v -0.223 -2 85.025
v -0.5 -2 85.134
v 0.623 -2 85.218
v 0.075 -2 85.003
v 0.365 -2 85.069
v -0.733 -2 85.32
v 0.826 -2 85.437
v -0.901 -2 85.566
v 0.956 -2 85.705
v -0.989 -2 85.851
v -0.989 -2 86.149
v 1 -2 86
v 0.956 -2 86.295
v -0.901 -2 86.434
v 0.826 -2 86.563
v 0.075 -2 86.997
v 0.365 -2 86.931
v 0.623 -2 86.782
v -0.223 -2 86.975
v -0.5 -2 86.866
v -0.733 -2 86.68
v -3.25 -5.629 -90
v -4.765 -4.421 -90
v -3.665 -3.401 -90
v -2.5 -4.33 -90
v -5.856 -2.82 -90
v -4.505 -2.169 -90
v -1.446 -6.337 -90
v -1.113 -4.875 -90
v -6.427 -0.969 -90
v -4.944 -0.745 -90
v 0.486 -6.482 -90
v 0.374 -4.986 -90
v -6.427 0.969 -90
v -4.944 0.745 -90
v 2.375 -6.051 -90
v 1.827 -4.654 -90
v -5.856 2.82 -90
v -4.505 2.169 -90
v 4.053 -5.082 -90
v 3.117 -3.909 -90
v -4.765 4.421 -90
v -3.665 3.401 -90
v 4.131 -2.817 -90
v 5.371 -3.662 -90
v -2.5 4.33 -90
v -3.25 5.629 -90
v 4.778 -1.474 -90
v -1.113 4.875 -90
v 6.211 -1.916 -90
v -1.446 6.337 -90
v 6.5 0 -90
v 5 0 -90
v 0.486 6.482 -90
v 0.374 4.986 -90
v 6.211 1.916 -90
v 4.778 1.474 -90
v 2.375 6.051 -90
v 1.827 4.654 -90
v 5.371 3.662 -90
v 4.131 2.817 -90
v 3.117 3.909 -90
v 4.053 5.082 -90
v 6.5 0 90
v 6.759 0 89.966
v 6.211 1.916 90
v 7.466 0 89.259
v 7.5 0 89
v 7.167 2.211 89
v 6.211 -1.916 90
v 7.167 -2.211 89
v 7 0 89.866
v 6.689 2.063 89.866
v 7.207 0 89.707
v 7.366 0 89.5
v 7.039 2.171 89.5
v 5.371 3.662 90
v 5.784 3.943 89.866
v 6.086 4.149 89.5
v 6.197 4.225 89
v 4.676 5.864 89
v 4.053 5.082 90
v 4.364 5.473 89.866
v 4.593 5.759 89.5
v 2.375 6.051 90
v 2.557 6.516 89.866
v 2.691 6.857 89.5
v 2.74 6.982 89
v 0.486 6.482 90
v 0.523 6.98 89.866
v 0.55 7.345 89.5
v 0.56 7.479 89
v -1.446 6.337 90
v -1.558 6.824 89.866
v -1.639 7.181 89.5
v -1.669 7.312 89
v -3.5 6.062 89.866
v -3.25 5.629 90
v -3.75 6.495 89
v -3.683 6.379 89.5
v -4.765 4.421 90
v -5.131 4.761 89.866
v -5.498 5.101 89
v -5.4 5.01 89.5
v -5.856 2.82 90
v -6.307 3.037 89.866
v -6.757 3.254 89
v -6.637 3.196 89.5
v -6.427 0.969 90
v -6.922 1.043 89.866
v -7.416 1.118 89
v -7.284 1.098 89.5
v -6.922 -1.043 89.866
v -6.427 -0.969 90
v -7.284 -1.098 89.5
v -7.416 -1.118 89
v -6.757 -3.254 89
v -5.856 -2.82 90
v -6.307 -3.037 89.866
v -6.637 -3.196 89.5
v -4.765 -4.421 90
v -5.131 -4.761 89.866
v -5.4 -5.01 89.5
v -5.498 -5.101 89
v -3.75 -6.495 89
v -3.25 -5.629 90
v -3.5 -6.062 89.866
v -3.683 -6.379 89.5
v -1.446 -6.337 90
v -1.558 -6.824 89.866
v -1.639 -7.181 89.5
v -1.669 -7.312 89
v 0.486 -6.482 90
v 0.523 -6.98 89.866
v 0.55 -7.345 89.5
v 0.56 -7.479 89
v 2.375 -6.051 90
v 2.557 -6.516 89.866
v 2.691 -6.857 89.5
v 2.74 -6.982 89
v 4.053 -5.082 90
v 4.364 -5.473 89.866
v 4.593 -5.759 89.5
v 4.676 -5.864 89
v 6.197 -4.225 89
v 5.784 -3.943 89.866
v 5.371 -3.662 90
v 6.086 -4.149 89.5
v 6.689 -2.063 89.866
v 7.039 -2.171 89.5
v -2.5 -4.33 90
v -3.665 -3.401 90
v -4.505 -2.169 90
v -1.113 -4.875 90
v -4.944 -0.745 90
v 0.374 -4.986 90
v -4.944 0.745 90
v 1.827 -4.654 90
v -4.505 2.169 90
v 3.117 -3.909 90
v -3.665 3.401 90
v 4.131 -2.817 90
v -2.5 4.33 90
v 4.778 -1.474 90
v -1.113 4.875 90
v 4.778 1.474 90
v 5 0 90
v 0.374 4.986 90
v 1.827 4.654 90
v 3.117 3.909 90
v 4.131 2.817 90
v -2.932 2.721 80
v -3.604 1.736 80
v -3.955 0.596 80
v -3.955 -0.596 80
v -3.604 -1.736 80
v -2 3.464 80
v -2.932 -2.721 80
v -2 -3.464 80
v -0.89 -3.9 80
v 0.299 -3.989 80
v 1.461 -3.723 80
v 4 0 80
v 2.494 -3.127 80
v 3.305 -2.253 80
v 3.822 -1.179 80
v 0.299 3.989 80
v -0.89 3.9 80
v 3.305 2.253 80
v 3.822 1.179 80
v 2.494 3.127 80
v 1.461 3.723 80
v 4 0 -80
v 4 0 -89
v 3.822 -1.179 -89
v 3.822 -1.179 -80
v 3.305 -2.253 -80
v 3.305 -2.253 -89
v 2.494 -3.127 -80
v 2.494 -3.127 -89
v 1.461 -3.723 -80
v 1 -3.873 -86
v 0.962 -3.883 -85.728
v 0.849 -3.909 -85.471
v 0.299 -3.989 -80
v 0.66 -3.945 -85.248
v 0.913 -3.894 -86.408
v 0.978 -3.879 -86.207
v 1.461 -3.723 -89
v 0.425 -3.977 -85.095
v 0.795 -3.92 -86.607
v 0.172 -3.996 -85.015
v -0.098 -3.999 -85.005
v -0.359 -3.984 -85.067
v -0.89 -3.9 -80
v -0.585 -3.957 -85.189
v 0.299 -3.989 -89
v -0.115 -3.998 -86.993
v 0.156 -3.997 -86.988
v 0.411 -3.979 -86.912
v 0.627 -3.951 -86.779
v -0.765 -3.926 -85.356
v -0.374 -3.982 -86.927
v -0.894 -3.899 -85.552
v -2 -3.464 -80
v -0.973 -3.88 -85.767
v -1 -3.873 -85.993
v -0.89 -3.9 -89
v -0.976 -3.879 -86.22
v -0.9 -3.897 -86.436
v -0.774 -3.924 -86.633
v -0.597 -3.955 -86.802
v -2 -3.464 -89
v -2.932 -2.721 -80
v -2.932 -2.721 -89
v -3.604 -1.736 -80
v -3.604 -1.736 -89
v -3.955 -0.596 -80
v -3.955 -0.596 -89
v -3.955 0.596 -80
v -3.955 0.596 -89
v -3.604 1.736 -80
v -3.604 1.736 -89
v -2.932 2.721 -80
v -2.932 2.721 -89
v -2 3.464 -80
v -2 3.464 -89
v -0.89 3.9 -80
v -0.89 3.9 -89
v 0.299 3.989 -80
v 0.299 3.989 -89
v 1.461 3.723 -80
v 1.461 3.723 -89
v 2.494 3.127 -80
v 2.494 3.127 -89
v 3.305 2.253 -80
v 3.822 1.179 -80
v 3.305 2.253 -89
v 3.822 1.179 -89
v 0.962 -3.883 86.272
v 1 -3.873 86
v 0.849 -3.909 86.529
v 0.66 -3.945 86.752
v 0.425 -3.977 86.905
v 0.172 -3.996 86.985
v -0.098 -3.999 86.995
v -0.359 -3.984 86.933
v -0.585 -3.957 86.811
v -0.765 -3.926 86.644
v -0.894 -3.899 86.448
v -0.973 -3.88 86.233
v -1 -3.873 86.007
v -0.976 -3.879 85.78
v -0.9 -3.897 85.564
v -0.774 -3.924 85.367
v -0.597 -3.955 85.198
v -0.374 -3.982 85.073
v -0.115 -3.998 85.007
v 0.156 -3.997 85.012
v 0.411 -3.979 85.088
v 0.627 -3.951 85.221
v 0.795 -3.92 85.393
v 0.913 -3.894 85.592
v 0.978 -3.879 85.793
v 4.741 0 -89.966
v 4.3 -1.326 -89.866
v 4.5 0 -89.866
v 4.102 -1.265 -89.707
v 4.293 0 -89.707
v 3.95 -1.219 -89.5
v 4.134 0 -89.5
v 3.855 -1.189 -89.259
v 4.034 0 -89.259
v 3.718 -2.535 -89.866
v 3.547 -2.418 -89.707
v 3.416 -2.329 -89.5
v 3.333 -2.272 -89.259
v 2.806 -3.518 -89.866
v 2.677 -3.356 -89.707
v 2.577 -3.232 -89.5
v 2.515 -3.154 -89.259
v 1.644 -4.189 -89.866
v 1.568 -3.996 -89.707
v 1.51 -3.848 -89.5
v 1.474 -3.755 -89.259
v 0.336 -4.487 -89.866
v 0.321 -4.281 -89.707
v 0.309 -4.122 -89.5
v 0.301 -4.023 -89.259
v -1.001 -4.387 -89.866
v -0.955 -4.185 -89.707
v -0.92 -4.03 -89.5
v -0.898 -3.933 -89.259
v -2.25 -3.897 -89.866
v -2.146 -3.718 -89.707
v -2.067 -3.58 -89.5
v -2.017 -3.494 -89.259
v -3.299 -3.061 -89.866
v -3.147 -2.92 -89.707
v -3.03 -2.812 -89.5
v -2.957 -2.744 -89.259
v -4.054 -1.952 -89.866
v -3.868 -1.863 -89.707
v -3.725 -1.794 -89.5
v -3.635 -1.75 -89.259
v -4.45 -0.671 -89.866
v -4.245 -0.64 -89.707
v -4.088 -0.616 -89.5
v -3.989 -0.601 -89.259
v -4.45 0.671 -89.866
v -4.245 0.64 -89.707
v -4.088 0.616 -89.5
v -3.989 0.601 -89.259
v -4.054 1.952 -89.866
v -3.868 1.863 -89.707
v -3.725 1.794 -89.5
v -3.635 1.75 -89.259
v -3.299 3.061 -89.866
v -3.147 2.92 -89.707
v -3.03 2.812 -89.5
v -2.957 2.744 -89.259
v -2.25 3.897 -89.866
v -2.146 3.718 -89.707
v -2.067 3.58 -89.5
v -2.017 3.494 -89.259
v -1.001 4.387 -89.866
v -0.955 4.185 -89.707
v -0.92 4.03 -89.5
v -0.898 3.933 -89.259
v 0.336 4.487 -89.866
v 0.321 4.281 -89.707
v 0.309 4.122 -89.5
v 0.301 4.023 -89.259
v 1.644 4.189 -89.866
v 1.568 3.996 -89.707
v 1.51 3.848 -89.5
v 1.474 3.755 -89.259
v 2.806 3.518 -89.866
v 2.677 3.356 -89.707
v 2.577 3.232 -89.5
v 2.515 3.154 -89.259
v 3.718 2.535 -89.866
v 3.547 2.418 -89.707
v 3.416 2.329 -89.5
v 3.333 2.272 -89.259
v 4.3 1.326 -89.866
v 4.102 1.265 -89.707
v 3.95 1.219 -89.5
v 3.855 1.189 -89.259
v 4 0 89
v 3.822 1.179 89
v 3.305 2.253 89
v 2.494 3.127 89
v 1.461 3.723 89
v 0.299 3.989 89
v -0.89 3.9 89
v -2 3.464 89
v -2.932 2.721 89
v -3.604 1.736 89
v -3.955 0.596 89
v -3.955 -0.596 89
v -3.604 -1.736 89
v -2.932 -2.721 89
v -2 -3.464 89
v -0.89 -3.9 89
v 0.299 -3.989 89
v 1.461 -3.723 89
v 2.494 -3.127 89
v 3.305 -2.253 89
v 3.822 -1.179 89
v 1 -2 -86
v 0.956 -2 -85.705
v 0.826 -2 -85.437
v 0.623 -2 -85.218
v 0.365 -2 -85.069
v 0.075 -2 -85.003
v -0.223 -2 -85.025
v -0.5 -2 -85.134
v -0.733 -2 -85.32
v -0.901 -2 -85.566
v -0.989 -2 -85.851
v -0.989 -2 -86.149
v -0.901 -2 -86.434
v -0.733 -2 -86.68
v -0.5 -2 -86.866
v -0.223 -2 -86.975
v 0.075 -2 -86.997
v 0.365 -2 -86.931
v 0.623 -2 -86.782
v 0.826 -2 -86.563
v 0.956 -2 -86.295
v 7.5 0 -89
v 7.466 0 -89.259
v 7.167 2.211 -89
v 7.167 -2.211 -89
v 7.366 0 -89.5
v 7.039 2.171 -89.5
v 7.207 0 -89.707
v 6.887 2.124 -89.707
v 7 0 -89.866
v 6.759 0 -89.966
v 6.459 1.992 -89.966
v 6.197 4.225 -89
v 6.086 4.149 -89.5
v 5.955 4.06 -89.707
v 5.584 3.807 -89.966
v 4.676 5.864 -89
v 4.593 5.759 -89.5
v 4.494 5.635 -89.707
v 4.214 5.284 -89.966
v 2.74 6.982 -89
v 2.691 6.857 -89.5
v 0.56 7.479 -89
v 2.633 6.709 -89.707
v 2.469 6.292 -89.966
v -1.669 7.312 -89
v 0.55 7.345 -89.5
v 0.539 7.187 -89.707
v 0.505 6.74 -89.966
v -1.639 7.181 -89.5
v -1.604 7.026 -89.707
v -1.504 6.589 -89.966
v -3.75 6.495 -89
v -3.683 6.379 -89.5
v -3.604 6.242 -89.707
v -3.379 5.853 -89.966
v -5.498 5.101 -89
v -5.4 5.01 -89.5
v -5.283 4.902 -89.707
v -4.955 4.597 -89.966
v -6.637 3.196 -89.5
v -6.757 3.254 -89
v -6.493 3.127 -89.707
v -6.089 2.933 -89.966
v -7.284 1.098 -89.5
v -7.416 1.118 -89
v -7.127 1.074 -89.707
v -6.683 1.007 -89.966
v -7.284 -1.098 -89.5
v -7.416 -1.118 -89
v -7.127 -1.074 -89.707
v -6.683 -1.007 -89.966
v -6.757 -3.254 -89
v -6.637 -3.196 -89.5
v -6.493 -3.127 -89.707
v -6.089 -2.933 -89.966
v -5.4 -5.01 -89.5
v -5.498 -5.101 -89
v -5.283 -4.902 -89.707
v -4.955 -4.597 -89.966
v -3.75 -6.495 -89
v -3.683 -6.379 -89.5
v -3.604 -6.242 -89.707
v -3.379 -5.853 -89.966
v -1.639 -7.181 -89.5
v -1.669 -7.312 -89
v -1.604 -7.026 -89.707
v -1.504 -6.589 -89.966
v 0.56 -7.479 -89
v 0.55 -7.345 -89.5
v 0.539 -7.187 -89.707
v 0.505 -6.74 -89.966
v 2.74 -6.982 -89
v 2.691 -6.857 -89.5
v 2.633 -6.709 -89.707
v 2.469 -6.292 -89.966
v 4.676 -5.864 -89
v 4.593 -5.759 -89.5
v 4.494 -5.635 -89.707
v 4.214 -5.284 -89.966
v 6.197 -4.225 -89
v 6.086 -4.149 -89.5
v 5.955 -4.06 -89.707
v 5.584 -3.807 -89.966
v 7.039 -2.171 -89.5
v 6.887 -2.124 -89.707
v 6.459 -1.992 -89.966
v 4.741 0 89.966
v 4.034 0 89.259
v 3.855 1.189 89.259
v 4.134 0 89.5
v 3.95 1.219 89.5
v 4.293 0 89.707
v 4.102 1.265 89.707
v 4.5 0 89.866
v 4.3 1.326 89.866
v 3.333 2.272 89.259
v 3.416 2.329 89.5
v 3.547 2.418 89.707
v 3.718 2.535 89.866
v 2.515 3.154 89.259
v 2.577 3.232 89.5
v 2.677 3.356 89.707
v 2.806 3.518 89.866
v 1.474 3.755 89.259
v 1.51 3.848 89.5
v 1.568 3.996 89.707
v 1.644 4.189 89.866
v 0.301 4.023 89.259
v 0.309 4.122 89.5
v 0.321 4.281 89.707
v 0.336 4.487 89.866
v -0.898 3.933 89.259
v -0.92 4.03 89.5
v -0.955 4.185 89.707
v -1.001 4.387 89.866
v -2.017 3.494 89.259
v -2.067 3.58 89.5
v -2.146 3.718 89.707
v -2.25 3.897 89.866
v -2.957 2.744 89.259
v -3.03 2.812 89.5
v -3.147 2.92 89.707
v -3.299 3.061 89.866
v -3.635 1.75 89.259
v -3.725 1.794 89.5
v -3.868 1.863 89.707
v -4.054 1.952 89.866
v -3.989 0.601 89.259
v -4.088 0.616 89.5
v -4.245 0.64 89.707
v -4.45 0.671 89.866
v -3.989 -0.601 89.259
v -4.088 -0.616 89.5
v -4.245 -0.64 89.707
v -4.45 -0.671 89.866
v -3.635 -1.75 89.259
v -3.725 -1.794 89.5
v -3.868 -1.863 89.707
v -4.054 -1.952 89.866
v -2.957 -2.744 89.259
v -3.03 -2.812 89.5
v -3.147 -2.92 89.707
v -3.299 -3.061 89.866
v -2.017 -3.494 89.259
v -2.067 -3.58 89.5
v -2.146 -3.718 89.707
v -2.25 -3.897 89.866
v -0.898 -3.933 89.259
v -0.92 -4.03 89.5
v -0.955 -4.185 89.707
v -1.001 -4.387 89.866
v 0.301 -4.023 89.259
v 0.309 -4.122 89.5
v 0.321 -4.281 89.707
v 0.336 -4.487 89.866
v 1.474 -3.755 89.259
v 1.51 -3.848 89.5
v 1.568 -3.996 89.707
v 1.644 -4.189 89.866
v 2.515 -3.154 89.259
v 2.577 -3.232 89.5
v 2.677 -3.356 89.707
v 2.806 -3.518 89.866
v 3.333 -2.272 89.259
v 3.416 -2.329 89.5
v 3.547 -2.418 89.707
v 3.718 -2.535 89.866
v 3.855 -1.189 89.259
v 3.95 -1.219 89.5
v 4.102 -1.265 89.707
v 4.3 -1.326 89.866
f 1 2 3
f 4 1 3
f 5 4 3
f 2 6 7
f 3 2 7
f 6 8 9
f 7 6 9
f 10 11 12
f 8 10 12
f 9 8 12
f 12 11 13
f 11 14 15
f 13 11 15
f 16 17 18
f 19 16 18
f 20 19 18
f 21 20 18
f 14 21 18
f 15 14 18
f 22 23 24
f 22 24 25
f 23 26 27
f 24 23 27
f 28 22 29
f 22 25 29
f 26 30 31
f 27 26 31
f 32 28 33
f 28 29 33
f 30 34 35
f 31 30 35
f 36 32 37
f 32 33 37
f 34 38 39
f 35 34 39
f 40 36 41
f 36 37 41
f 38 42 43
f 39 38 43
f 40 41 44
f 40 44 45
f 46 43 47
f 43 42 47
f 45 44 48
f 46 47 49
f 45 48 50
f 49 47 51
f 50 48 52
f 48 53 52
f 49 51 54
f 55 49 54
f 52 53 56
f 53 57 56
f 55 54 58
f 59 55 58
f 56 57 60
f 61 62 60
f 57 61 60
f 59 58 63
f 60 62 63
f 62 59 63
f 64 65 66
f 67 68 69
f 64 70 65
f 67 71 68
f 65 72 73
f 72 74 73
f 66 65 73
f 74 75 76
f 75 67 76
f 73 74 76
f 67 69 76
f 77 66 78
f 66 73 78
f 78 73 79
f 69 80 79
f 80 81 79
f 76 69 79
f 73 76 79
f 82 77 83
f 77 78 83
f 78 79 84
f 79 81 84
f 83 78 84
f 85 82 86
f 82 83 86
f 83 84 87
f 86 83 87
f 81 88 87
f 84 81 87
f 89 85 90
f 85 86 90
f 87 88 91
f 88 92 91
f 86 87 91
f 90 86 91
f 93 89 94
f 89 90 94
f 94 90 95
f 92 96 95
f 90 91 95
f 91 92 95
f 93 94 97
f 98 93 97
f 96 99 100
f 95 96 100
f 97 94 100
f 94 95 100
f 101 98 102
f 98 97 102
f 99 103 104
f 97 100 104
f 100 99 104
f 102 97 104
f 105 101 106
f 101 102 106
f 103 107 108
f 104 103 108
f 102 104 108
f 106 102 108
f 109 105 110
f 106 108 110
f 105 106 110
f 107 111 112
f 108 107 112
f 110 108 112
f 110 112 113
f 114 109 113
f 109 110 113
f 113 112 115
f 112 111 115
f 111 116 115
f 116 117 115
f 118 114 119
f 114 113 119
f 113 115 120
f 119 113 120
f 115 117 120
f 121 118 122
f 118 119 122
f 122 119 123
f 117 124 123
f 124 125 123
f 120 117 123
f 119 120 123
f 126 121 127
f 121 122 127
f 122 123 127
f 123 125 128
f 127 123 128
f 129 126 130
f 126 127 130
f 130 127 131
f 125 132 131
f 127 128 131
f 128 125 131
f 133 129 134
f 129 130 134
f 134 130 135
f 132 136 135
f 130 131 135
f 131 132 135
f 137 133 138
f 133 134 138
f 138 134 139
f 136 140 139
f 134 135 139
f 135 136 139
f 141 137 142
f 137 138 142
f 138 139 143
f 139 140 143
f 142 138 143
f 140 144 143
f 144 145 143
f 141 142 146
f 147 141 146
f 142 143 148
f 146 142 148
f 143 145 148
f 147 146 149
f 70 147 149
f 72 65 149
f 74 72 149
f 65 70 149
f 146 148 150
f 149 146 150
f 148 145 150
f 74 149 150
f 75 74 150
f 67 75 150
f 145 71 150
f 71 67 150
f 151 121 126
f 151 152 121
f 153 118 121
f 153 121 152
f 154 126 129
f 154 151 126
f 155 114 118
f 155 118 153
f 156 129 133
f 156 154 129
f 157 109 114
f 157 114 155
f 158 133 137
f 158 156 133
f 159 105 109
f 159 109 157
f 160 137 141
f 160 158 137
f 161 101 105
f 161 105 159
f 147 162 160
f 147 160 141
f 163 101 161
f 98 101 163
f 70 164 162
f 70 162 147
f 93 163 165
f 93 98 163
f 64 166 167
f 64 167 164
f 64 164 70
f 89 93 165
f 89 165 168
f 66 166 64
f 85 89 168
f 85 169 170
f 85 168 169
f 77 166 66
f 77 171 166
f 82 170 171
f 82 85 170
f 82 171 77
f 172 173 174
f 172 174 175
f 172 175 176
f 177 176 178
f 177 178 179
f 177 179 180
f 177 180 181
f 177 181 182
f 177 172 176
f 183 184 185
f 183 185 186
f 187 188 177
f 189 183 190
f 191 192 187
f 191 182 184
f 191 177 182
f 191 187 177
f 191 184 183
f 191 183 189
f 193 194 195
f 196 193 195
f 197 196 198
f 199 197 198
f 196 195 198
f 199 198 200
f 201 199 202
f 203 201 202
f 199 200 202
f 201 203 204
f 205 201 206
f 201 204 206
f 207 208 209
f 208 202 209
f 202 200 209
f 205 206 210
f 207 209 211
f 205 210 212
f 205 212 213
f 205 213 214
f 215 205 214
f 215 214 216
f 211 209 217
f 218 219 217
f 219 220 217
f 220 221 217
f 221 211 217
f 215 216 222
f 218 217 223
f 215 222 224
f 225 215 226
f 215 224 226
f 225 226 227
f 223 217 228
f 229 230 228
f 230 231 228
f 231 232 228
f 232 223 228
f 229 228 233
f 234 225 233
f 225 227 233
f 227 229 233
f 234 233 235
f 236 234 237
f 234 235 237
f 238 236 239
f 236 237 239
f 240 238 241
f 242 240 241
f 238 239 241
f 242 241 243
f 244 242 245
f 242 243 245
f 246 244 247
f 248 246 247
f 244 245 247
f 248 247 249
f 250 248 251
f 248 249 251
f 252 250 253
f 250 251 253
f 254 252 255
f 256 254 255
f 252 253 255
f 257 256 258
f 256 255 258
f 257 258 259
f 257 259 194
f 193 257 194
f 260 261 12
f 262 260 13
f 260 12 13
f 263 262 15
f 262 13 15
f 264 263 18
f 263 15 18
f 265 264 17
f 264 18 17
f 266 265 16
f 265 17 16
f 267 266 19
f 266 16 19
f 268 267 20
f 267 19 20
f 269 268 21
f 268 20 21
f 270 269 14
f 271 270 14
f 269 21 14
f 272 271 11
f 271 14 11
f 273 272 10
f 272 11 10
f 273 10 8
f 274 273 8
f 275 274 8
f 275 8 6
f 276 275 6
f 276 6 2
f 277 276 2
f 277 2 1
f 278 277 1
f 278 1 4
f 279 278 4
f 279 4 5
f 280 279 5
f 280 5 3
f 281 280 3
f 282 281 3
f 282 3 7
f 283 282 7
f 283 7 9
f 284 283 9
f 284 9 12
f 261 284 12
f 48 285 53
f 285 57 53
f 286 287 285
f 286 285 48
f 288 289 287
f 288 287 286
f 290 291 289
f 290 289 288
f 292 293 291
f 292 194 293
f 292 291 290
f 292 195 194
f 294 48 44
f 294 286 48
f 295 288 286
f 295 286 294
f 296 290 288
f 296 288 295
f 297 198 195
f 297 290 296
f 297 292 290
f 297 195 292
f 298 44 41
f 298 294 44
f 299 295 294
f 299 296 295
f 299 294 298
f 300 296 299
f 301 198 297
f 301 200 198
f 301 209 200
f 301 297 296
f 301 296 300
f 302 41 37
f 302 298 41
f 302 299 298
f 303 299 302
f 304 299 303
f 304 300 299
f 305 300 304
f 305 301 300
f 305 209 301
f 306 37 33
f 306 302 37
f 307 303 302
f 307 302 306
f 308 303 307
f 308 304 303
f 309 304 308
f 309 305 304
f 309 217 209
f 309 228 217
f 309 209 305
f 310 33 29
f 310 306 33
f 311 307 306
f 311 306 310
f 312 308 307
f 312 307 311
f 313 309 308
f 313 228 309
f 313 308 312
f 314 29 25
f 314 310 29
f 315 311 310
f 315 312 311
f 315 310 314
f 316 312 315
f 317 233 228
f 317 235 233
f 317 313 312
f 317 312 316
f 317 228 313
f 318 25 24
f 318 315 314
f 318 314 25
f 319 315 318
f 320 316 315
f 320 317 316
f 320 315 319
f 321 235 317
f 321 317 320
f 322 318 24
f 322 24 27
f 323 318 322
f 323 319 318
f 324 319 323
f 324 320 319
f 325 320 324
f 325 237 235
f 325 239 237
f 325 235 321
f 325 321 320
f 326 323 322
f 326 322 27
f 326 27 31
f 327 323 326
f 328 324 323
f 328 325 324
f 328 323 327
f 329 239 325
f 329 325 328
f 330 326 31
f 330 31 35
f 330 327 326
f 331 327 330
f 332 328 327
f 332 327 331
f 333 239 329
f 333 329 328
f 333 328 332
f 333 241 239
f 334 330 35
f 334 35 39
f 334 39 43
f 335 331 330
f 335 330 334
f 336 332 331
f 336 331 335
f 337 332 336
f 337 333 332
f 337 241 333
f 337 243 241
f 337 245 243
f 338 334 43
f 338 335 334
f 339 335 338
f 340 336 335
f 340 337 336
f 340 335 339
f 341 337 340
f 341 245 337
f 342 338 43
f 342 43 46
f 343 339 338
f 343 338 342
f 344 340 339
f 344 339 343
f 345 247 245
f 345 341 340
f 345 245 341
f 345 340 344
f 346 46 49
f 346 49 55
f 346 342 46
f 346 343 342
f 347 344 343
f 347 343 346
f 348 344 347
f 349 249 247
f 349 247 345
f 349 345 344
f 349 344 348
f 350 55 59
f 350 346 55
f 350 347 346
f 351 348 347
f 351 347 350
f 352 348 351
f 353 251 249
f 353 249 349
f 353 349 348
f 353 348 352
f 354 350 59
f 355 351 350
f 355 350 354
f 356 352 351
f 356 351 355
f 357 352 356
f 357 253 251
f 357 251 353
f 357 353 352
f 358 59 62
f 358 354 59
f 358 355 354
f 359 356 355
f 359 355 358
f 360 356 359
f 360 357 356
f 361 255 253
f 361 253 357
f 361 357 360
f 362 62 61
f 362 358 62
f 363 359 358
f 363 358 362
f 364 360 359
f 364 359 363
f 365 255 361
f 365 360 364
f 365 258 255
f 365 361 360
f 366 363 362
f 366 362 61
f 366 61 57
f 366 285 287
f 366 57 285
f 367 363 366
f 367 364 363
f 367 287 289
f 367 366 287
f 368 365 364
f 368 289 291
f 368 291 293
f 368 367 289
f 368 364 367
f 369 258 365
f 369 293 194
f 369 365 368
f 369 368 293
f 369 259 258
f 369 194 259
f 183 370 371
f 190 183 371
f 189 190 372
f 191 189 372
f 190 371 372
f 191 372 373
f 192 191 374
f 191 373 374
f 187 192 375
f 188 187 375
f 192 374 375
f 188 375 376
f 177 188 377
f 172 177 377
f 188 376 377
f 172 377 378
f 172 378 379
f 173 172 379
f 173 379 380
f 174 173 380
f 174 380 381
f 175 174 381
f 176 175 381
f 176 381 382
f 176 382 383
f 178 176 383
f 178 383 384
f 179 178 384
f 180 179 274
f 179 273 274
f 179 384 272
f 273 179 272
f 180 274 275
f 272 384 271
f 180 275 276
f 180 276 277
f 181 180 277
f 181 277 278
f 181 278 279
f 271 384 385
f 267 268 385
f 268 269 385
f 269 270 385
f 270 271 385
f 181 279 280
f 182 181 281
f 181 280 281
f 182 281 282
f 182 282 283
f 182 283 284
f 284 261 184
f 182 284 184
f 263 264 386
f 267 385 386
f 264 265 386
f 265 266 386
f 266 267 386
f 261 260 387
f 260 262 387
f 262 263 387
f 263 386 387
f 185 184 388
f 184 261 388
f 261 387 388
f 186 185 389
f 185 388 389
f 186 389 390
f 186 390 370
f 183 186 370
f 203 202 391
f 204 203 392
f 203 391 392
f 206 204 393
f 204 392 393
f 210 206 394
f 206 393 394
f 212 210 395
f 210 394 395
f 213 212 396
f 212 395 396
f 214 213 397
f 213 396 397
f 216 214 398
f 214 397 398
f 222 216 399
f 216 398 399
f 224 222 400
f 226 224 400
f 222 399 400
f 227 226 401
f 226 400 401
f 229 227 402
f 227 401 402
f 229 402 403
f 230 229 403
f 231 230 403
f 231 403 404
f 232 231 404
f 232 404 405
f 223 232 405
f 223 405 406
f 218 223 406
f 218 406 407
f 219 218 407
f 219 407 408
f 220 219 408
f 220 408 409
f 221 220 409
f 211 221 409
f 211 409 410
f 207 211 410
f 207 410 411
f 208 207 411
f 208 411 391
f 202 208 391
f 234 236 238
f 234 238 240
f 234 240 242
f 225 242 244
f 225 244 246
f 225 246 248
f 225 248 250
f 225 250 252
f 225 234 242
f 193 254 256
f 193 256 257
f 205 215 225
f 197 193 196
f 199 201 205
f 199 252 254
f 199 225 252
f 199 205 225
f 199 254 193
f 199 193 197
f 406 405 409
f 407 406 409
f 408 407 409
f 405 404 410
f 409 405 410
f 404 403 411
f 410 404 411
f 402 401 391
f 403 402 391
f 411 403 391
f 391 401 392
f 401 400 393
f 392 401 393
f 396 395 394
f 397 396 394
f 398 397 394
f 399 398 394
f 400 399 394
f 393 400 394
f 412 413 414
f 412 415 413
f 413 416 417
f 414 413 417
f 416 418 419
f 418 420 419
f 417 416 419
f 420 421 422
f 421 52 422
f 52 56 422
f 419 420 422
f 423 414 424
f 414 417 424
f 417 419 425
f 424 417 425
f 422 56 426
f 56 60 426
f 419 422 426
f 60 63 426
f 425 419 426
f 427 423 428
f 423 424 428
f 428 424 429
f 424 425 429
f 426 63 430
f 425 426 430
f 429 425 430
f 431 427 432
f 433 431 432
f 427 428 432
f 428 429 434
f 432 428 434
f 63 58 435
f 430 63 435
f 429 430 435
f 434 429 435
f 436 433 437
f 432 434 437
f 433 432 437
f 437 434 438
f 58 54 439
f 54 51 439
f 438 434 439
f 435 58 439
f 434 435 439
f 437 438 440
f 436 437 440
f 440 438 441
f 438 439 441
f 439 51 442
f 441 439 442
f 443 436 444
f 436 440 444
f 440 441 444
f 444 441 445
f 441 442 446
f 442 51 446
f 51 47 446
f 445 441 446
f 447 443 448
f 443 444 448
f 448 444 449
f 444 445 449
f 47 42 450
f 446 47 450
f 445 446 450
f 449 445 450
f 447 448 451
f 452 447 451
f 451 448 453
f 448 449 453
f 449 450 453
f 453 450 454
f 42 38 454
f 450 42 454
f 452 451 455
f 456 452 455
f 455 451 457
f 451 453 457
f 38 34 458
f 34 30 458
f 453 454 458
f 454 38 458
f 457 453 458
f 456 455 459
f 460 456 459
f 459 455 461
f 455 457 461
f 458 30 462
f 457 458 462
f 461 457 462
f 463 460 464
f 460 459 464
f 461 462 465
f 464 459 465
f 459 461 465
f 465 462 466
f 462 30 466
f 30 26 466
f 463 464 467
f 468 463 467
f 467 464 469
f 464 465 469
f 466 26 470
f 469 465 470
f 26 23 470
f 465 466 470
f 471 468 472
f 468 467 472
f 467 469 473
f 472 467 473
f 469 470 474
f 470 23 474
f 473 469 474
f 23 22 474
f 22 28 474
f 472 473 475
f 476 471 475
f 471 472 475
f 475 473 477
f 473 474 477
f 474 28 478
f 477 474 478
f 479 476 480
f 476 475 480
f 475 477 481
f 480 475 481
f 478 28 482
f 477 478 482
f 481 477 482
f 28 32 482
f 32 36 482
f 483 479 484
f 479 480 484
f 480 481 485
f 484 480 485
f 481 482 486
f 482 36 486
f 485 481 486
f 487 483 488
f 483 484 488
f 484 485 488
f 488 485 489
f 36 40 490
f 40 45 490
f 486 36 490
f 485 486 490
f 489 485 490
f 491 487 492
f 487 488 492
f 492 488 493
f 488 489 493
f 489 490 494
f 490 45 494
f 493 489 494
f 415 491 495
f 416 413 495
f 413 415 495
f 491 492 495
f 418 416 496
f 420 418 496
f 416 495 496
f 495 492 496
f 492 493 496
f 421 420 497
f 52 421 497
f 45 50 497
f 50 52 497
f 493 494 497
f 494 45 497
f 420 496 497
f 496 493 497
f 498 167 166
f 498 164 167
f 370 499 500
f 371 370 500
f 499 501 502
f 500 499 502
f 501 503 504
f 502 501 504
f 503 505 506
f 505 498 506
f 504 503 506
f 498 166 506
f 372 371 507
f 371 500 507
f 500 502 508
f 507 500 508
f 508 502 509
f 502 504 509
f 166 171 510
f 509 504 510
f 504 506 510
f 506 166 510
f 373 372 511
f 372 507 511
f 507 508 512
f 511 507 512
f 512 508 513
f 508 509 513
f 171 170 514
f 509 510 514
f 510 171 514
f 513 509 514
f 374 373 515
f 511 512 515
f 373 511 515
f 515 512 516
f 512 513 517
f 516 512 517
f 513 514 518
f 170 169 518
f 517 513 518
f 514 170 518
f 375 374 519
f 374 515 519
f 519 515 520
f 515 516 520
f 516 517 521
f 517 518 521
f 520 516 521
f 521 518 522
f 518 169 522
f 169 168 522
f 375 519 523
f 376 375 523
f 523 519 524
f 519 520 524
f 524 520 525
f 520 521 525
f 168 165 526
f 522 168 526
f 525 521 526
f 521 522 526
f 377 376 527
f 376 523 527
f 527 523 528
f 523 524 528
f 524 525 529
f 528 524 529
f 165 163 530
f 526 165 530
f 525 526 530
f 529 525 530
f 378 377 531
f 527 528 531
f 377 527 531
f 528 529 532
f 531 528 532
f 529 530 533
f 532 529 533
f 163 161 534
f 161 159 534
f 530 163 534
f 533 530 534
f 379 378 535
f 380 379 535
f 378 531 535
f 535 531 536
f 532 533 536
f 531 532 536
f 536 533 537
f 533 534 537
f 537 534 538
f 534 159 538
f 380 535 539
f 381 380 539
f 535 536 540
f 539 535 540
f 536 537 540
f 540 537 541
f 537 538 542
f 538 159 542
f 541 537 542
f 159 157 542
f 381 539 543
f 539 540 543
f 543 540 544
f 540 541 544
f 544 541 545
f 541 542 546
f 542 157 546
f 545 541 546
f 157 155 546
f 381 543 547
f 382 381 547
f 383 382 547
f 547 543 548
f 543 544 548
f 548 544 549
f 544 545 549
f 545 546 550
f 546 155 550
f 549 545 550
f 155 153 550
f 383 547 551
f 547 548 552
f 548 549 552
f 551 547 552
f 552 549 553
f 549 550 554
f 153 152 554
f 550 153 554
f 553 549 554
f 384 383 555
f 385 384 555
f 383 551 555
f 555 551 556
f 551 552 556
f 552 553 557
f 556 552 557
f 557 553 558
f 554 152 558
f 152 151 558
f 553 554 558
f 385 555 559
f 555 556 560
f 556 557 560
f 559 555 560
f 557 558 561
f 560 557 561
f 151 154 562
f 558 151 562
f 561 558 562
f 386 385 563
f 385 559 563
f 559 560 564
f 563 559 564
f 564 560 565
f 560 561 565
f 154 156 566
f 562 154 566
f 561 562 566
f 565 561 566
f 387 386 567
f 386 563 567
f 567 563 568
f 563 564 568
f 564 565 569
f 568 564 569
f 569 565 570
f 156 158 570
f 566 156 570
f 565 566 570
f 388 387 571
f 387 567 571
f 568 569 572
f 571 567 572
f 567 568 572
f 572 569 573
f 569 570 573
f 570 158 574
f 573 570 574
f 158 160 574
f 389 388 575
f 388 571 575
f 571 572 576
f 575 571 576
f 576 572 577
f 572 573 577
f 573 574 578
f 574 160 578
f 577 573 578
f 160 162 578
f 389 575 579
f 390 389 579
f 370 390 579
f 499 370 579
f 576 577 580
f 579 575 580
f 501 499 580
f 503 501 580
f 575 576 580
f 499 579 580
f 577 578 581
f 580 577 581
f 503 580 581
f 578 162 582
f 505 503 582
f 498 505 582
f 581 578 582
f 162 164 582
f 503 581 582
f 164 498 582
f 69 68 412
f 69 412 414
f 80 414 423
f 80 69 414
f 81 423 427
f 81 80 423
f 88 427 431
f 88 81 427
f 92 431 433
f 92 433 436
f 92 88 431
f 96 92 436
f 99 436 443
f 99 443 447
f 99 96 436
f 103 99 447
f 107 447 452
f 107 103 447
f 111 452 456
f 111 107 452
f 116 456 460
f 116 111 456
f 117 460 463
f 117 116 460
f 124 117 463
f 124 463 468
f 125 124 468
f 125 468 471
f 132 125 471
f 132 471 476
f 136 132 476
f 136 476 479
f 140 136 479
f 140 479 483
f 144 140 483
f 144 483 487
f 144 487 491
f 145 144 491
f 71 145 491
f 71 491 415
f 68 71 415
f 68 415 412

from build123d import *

# Parameters (mm, degrees)
F0_R     = 7.5
F1_DEPTH = 90
F2_R     = 4
F3_DEPTH = 10
F4_R     = 4
F5_DEPTH = 10
F6_R     = 1
F7_DEPTH = 5.0000001171
F8_DEPTH = 2
F9_R     = 1


with BuildPart() as f1:
    # F0 (on Top) → F1 (new body, symmetric)
    with BuildSketch(Plane.XY):
        Circle(F0_R)
    extrude(amount=F1_DEPTH, both=True)

    # F2 (on face) → F3 (cut)
    with BuildSketch(Plane.XY.offset(90)):
        Circle(F2_R)
    extrude(amount=-F3_DEPTH, mode=Mode.SUBTRACT)

    # F4 (on face) → F5 (cut)
    with BuildSketch(Plane(origin=(0, 0, -90), x_dir=(1, 0, 0), z_dir=(0, 0, -1))):
        Circle(F4_R)
    extrude(amount=-F5_DEPTH, mode=Mode.SUBTRACT)

    # F6 (on Front) → F7 (join, up to face)
    with BuildSketch(Plane.XZ):
        with Locations((0, 86)):
            Circle(F6_R)
        with Locations((0, -86)):
            Circle(F6_R)
    extrude(amount=F7_DEPTH)

    # F8 (cut): faces of the model
    f8_faces = [f1.faces().sort_by_distance(p)[0] for p in [
        (0, 0, 86),
        (0, 0, -86),
    ]]
    extrude(f8_faces, amount=-F8_DEPTH, mode=Mode.SUBTRACT)

    # F9
    f9_edges = [f1.edges().sort_by_distance(p)[0] for p in [
        (-7.5, 0, -90),
        (-4, 0, -90),
        (-7.5, 0, 90),
        (-4, 0, 90),
    ]]
    fillet(f9_edges, radius=F9_R)


solid = f1.part
